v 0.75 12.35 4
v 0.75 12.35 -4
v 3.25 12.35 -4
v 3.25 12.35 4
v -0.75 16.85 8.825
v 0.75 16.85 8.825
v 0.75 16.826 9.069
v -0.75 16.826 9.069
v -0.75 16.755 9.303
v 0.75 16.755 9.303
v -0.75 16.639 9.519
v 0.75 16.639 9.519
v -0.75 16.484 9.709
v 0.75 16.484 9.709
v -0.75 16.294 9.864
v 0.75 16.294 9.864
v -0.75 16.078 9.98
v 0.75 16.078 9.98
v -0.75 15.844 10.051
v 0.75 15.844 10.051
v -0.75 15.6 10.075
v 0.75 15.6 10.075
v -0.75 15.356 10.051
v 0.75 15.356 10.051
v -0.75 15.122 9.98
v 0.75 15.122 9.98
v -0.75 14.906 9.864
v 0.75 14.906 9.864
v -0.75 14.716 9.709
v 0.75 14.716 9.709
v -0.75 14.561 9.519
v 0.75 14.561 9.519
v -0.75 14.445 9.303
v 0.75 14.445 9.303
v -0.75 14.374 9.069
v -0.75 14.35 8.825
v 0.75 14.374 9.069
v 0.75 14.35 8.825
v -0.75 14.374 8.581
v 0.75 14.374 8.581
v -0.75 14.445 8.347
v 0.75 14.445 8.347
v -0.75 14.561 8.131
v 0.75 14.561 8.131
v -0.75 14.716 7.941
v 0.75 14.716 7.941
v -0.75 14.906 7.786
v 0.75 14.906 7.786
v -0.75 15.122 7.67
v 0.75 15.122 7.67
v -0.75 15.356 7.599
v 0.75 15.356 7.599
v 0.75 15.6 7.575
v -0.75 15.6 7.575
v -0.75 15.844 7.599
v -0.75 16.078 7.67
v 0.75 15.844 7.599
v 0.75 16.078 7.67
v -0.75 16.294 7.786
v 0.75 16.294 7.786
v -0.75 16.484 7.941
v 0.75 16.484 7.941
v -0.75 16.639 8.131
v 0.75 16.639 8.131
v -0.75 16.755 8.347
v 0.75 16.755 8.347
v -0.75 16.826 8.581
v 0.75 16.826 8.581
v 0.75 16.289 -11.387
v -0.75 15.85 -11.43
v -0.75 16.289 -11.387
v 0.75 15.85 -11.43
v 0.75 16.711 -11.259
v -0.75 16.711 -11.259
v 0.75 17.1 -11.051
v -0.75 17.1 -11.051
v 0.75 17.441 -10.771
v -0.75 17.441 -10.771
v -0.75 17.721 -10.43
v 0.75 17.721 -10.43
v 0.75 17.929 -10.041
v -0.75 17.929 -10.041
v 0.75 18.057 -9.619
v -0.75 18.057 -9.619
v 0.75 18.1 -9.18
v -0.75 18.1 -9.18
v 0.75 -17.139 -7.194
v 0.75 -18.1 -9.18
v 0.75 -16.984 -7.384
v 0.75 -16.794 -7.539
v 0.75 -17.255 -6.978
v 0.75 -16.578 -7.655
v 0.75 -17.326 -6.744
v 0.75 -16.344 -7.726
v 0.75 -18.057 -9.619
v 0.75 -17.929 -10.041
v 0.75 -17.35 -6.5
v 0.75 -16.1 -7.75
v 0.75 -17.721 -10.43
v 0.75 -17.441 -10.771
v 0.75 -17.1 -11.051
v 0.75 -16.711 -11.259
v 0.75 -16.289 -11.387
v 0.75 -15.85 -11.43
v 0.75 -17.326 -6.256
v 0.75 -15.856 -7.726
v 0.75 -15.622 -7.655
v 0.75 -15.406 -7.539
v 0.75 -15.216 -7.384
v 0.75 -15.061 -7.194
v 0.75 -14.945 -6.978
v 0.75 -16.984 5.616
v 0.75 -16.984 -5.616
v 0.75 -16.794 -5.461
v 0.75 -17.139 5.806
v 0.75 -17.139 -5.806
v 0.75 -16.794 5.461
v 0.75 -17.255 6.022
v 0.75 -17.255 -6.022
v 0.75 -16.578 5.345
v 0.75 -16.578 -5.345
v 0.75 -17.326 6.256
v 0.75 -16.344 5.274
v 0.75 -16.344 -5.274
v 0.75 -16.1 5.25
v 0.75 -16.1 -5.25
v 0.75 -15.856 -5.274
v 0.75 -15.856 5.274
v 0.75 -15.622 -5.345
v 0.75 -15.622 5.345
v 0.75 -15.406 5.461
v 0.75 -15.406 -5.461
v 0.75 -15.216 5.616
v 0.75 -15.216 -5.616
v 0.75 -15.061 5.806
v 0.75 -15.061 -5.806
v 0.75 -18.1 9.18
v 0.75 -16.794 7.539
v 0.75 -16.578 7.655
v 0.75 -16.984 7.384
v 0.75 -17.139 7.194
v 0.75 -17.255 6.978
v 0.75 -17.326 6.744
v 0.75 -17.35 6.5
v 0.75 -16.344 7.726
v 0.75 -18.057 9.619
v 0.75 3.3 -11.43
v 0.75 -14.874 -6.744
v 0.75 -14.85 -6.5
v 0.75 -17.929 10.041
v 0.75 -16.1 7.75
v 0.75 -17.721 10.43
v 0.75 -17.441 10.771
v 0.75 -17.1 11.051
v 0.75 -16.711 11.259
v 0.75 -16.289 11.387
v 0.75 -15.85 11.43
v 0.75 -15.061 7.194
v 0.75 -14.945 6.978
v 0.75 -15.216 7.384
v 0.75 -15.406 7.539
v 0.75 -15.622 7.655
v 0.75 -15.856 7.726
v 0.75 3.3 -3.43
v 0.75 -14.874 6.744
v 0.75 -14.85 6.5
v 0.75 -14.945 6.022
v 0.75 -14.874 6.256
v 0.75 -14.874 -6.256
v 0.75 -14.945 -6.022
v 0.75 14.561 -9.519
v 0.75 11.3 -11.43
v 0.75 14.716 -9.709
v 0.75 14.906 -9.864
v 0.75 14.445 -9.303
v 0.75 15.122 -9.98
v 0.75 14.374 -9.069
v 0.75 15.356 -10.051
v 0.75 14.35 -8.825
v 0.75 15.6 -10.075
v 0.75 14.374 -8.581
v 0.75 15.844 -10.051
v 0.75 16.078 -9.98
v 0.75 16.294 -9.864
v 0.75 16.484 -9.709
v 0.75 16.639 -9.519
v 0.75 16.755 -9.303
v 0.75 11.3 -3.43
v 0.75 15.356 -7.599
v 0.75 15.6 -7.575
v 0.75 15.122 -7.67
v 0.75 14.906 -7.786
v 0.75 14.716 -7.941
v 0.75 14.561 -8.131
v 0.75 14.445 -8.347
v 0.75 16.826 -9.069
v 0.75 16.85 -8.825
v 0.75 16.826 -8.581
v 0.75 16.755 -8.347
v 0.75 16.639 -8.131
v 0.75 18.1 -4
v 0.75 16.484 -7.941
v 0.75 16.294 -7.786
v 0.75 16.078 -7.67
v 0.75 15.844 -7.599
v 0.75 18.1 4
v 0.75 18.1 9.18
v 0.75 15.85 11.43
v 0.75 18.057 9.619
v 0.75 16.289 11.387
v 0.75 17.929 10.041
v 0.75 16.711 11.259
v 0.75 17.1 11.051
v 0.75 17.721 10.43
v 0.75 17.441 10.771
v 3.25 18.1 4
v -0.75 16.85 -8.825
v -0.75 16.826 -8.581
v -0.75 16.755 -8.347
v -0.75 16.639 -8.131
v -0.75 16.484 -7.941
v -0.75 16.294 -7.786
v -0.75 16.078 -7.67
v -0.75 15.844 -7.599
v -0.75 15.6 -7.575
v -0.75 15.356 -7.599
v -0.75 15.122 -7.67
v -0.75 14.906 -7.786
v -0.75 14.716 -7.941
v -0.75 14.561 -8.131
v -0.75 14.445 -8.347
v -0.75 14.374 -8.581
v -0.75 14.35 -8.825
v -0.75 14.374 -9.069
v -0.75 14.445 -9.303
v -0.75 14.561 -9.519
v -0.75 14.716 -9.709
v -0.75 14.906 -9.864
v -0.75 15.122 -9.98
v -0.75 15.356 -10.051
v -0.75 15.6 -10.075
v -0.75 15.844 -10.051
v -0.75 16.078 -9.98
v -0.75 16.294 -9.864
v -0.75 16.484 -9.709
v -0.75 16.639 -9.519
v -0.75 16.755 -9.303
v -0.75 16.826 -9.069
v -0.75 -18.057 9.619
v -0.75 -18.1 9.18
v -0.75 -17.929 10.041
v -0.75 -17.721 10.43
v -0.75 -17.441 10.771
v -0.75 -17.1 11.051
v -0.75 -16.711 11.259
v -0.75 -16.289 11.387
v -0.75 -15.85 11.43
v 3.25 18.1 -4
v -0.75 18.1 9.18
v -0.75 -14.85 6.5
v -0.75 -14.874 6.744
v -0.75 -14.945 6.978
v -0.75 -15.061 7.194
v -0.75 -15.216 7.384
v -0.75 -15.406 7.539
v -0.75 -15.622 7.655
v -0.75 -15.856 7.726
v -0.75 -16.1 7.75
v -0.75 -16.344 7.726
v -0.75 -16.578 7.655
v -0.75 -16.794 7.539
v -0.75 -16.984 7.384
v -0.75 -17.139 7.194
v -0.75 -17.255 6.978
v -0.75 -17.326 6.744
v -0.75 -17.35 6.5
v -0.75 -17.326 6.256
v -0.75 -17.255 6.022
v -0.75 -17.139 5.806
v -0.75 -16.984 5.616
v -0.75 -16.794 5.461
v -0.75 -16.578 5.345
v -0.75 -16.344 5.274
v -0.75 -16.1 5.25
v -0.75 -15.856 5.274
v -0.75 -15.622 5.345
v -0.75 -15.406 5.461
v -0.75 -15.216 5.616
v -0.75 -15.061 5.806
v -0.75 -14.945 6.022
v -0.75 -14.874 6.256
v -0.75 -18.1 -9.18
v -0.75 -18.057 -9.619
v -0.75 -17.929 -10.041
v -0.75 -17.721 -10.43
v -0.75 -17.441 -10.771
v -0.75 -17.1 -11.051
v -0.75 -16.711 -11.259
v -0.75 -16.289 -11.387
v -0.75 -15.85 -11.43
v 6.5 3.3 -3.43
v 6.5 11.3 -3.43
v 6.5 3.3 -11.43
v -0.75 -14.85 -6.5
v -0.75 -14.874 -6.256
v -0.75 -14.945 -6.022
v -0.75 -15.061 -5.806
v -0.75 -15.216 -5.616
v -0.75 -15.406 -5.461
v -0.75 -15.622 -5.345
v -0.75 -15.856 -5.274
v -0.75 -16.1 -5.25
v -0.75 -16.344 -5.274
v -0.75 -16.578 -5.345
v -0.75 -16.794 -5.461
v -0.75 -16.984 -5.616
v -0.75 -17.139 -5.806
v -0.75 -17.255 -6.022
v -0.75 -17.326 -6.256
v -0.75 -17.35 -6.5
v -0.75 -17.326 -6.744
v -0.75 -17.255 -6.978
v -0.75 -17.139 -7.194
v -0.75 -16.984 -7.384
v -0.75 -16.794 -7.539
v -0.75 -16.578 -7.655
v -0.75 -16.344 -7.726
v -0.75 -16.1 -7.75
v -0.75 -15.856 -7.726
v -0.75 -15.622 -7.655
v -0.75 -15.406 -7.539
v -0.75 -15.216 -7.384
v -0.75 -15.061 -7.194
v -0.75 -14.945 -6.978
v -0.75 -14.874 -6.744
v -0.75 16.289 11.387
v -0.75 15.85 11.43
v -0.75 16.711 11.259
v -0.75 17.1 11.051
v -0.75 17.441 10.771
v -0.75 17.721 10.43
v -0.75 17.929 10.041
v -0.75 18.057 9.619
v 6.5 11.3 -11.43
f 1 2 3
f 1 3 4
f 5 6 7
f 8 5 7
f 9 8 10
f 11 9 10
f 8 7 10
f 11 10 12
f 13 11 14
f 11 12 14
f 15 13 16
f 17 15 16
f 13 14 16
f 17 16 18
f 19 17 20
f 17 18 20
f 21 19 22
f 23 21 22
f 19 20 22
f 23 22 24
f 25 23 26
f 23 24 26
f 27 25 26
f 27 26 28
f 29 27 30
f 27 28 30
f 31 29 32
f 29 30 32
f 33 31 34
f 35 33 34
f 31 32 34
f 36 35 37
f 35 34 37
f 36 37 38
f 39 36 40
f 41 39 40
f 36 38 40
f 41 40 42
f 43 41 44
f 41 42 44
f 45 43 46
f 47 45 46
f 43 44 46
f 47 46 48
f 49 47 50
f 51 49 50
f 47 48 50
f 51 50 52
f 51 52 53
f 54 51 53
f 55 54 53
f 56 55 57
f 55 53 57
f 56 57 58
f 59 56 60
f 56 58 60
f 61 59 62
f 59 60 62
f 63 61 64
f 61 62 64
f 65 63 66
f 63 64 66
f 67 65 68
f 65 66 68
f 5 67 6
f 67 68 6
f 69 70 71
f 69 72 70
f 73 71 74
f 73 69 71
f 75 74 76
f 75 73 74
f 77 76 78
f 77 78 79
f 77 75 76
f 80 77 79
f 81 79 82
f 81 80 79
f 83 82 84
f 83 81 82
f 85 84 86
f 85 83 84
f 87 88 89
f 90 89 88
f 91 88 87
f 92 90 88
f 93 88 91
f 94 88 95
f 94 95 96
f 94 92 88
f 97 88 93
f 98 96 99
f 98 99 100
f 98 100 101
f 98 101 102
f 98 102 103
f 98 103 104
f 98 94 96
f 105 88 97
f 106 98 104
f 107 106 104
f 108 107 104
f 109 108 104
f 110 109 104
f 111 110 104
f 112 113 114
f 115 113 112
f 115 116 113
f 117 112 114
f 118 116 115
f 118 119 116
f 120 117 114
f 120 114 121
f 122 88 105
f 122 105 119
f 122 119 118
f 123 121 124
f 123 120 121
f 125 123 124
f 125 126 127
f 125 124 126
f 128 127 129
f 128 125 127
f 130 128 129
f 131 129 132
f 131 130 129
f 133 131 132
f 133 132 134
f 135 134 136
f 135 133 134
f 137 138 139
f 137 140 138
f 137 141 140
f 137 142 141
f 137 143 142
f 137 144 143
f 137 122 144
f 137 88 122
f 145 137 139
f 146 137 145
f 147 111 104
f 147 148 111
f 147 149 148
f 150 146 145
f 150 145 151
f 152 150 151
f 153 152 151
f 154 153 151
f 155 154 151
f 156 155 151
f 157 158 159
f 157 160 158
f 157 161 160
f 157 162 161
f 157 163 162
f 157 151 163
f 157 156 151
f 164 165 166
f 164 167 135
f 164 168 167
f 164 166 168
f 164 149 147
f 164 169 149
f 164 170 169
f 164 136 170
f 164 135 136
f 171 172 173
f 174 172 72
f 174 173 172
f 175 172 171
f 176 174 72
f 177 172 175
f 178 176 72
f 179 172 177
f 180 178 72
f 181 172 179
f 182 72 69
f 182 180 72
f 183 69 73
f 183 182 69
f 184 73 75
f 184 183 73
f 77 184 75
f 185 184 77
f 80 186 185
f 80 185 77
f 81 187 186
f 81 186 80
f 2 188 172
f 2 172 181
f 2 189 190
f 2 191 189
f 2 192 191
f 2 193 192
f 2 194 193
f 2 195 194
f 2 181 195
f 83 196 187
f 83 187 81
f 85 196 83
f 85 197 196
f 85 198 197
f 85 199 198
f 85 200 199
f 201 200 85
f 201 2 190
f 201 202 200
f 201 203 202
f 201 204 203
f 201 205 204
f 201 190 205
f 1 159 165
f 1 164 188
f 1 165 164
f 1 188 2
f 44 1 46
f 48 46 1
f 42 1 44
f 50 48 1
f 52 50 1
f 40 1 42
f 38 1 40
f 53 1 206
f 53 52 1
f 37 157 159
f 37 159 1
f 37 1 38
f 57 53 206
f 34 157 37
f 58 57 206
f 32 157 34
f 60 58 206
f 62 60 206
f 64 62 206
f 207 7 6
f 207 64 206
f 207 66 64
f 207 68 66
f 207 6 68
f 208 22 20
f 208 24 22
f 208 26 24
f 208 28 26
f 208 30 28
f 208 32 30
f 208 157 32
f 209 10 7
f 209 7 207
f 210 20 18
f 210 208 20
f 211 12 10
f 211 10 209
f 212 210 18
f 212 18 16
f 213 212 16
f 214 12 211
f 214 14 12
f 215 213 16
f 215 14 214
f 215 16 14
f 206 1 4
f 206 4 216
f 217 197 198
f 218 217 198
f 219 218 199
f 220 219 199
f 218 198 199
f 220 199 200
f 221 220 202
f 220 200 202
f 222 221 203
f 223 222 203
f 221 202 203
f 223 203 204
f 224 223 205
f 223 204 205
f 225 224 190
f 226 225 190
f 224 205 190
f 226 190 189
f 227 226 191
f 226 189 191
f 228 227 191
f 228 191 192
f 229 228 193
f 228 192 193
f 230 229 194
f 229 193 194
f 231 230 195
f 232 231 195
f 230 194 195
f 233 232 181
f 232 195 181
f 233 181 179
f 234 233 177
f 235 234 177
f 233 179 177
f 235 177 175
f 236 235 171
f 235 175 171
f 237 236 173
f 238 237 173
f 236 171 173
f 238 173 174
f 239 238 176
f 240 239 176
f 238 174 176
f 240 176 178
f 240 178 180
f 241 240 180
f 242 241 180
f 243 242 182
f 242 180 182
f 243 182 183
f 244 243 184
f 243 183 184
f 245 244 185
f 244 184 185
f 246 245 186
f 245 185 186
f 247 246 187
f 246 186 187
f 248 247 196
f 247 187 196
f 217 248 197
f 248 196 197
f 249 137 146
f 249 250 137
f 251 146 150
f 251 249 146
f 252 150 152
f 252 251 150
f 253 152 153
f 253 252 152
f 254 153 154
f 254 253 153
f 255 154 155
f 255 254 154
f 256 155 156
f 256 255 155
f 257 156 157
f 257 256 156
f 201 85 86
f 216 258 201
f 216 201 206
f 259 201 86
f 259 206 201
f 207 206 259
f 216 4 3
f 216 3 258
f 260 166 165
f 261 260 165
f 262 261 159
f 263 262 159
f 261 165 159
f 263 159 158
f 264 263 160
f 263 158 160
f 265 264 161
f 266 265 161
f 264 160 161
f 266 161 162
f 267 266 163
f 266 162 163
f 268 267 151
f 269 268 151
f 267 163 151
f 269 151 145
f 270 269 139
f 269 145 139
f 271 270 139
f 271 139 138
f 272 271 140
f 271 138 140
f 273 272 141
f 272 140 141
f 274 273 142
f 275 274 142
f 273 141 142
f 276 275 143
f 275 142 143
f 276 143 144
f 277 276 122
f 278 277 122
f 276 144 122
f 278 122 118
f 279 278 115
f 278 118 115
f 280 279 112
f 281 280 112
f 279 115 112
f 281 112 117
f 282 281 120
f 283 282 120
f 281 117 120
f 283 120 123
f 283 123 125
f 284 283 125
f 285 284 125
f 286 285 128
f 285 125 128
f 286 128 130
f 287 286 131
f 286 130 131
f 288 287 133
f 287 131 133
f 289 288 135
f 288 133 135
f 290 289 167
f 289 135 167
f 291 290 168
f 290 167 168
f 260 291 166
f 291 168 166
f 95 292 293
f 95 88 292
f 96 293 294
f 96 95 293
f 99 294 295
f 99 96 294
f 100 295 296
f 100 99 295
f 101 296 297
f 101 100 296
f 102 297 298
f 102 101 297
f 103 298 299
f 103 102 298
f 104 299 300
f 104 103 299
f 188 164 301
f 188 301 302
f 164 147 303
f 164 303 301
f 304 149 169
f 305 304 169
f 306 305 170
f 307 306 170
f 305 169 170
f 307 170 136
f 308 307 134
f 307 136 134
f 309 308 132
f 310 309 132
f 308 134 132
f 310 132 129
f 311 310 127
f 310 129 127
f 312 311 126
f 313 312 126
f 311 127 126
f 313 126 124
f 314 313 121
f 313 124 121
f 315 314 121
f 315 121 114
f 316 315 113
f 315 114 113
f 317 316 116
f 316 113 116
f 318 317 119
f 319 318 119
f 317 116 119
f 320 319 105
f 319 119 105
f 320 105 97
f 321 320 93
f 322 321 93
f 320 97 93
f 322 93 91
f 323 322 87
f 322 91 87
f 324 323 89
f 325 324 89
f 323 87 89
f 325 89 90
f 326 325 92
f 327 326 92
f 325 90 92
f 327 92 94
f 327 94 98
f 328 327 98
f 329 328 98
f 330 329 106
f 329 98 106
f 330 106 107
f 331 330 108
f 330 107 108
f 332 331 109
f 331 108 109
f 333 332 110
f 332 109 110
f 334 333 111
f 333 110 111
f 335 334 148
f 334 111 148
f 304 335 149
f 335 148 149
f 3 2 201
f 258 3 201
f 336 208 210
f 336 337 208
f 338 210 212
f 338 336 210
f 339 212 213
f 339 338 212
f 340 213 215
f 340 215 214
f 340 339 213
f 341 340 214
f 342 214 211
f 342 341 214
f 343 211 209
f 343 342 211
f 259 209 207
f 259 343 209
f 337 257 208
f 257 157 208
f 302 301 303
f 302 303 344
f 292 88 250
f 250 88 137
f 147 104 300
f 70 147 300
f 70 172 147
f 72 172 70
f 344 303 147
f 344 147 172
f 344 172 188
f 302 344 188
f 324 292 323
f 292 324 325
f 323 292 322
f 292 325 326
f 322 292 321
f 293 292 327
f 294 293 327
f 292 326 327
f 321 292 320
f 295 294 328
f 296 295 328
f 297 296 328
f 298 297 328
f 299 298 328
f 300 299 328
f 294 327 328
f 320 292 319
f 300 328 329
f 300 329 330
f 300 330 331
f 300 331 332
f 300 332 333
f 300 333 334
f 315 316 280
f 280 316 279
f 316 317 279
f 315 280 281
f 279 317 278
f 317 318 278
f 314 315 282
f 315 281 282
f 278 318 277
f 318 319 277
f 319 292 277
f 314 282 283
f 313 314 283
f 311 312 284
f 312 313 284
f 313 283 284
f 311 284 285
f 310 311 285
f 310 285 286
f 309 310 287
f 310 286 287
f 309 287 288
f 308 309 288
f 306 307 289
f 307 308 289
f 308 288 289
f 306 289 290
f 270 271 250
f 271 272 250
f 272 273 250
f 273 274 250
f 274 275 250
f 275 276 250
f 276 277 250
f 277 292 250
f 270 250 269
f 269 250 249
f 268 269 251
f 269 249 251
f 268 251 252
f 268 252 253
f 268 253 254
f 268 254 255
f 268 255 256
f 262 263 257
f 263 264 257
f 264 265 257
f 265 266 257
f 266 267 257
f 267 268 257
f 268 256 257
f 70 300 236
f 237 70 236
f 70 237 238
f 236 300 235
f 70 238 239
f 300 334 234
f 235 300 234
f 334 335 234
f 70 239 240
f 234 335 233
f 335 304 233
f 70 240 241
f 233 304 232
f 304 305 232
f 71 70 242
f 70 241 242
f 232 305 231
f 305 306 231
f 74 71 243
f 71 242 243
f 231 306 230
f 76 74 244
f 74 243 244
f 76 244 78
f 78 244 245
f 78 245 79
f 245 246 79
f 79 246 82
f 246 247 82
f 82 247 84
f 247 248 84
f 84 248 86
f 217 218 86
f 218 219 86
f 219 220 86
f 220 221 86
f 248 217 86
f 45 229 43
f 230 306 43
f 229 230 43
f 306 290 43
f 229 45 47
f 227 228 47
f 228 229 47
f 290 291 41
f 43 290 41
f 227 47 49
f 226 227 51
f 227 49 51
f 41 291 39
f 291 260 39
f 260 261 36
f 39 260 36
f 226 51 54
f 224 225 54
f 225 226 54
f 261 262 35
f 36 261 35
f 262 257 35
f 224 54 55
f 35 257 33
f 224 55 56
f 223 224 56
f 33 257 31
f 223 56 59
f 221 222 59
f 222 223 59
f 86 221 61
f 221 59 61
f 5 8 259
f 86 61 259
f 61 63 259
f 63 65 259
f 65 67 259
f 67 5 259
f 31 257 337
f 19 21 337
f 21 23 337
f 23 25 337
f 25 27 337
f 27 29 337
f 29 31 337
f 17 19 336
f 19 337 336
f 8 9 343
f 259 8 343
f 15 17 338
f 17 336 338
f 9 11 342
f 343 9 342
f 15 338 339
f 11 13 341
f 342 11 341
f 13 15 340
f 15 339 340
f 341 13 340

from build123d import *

# Parameters (mm, degrees)
F0_W     = 36.2
F0_H     = 22.86
F1_DEPTH = 0.75
F2_W     = 8
F2_H     = 8
F3_DEPTH = 5.75
F2_W_2   = 5.75
F4_DEPTH = 2.5
F5_R     = 2.25
F6_R     = 1.25
F7_DEPTH = 1.5


with BuildPart() as f1:
    # F0 (on Right) → F1 (new body, symmetric)
    with BuildSketch(Plane.YZ):
        Rectangle(F0_W, F0_H)
    extrude(amount=F1_DEPTH, both=True)

    # F2 (on face) → F3 (join)
    with BuildSketch(Plane.YZ.offset(0.75)):
        with Locations((7.3, -7.43)):
            Rectangle(F2_W, F2_H)
    extrude(amount=F3_DEPTH)

    # F2 (on face) → F4 (join)
    with BuildSketch(Plane.YZ.offset(0.75)):
        with Locations((15.225, 0)):
            Rectangle(F2_W_2, F2_H)
    extrude(amount=F4_DEPTH)

    # F5
    f5_edges = [f1.edges().sort_by_distance(p)[0] for p in [
        (0, -18.1, 11.43),
        (0, 18.1, 11.43),
        (0, 18.1, -11.43),
        (0, -18.1, -11.43),
    ]]
    fillet(f5_edges, radius=F5_R)

    # F6 (on face) → F7 (cut, through all)
    with BuildSketch(Plane.YZ.offset(0.75)):
        with Locations((15.6, 8.825)):
            Circle(F6_R)
        with Locations((15.6, -8.825)):
            Circle(F6_R)
        with Locations((-16.1, 6.5)):
            Circle(F6_R)
        with Locations((-16.1, -6.5)):
            Circle(F6_R)
    extrude(amount=-F7_DEPTH, mode=Mode.SUBTRACT)


solid = f1.part
